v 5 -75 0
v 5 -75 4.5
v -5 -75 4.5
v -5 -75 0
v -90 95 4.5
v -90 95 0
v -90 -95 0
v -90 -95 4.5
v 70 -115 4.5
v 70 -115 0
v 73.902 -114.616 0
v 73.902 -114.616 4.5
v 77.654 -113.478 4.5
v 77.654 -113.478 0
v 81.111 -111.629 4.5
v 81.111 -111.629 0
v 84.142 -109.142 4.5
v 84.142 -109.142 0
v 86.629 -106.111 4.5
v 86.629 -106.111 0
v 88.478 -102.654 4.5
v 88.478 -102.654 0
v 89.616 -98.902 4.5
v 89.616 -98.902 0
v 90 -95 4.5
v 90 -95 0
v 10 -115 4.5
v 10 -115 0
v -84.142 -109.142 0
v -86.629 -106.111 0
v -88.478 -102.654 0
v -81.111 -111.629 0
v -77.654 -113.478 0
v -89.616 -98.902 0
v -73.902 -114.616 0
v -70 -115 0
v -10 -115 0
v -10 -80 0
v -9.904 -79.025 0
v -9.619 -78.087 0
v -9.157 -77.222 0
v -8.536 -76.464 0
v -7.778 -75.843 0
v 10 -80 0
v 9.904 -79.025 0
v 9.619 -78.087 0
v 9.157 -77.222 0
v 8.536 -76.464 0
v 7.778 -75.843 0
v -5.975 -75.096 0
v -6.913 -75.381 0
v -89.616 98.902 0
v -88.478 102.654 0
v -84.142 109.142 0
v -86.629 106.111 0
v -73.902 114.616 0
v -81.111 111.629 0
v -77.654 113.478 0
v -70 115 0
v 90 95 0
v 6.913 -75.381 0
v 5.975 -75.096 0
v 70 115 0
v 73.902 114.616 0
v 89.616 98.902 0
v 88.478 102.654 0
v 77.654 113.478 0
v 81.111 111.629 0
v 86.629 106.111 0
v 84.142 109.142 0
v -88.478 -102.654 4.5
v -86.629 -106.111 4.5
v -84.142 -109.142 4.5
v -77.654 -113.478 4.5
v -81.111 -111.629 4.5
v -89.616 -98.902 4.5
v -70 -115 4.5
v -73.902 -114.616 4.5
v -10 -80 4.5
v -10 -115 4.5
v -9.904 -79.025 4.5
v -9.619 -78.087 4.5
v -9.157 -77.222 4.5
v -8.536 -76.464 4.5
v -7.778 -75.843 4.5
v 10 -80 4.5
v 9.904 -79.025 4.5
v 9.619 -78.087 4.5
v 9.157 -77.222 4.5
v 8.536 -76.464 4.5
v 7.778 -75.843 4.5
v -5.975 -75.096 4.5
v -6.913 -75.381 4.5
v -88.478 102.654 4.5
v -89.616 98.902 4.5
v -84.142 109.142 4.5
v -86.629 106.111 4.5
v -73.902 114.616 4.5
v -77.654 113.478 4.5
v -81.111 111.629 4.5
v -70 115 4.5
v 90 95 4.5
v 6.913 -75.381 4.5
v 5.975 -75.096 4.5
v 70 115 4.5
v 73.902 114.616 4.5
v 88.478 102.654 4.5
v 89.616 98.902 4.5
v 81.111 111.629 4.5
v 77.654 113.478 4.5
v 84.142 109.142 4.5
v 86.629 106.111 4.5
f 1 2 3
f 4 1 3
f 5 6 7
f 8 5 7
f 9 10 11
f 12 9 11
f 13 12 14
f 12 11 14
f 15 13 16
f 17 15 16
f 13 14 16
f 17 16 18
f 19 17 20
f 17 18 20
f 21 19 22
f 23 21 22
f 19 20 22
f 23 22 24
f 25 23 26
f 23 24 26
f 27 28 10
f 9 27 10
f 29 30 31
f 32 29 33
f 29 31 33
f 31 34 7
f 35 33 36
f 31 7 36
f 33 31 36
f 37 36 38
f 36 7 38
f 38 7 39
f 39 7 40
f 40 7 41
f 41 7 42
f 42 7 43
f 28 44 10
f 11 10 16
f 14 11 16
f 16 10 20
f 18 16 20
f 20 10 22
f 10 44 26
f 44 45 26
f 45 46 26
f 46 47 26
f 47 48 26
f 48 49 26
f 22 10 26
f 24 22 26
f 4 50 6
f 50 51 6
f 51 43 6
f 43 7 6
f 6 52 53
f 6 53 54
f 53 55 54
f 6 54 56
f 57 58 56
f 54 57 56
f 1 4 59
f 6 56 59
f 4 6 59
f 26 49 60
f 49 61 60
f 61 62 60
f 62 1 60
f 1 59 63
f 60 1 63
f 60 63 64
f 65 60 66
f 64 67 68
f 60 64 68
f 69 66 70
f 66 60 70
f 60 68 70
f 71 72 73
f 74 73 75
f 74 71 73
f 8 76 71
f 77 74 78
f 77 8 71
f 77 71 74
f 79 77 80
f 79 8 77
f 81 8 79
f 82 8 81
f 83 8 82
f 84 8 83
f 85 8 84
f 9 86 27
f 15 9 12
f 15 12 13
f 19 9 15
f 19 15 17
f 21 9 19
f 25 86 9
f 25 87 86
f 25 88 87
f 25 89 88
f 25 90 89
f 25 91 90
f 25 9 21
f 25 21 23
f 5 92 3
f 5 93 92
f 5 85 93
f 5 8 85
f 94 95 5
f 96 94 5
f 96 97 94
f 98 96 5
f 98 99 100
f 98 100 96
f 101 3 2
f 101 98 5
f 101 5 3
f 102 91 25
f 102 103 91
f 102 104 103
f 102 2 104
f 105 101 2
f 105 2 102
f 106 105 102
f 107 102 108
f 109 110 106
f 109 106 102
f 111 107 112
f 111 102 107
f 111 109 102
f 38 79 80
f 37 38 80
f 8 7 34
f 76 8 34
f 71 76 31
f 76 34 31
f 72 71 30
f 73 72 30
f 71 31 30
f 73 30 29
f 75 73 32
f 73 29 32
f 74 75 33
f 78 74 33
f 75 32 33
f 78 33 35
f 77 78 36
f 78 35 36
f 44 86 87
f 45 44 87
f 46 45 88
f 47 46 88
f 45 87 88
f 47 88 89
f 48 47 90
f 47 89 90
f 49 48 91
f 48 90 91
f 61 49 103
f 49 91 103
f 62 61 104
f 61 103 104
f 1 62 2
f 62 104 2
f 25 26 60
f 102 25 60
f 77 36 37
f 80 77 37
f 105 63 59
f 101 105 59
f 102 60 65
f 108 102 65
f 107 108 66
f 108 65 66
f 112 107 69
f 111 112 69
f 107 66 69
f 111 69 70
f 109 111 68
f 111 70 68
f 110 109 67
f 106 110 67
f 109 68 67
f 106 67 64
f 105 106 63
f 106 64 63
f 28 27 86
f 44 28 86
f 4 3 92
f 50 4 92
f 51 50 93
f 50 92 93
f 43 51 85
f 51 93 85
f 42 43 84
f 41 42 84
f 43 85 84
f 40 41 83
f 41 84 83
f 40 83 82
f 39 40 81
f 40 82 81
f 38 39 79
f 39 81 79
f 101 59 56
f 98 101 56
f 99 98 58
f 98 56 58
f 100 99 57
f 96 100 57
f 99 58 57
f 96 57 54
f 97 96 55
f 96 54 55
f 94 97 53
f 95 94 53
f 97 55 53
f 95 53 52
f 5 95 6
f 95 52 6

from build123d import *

# Parameters (mm, degrees)
EXTRUDE_1_DEPTH     = 4.5
CUT_EXTRUDE_1_DEPTH = 4.5


with BuildPart() as part:
    # 草图1 → 凸台-拉伸1 (new body)
    with BuildSketch(Plane.XY):
        with BuildLine():
            Line((-70, -115), (70, -115))
            ThreePointArc((70, -115), (84.142135624, -109.142135624), (90, -95))
            Line((90, -95), (90, 95))
            ThreePointArc((90, 95), (84.142135624, 109.142135624), (70, 115))
            Line((70, 115), (-70, 115))
            ThreePointArc((-70, 115), (-84.142135624, 109.142135624), (-90, 95))
            Line((-90, 95), (-90, -95))
            ThreePointArc((-90, -95), (-84.142135624, -109.142135624), (-70, -115))
        make_face()
    extrude(amount=EXTRUDE_1_DEPTH)

    # 草图2 → 切除-拉伸1 (cut)
    with BuildSketch(Plane.XY.offset(4.5)):
        with BuildLine():
            Line((-10, -155), (10, -155))
            Line((10, -155), (10, -80))
            ThreePointArc((10, -80), (8.535533906, -76.464466094), (5, -75))
            Line((5, -75), (-5, -75))
            ThreePointArc((-5, -75), (-8.535533906, -76.464466094), (-10, -80))
            Line((-10, -80), (-10, -155))
        make_face()
    extrude(amount=-CUT_EXTRUDE_1_DEPTH, mode=Mode.SUBTRACT)


solid = part.part
